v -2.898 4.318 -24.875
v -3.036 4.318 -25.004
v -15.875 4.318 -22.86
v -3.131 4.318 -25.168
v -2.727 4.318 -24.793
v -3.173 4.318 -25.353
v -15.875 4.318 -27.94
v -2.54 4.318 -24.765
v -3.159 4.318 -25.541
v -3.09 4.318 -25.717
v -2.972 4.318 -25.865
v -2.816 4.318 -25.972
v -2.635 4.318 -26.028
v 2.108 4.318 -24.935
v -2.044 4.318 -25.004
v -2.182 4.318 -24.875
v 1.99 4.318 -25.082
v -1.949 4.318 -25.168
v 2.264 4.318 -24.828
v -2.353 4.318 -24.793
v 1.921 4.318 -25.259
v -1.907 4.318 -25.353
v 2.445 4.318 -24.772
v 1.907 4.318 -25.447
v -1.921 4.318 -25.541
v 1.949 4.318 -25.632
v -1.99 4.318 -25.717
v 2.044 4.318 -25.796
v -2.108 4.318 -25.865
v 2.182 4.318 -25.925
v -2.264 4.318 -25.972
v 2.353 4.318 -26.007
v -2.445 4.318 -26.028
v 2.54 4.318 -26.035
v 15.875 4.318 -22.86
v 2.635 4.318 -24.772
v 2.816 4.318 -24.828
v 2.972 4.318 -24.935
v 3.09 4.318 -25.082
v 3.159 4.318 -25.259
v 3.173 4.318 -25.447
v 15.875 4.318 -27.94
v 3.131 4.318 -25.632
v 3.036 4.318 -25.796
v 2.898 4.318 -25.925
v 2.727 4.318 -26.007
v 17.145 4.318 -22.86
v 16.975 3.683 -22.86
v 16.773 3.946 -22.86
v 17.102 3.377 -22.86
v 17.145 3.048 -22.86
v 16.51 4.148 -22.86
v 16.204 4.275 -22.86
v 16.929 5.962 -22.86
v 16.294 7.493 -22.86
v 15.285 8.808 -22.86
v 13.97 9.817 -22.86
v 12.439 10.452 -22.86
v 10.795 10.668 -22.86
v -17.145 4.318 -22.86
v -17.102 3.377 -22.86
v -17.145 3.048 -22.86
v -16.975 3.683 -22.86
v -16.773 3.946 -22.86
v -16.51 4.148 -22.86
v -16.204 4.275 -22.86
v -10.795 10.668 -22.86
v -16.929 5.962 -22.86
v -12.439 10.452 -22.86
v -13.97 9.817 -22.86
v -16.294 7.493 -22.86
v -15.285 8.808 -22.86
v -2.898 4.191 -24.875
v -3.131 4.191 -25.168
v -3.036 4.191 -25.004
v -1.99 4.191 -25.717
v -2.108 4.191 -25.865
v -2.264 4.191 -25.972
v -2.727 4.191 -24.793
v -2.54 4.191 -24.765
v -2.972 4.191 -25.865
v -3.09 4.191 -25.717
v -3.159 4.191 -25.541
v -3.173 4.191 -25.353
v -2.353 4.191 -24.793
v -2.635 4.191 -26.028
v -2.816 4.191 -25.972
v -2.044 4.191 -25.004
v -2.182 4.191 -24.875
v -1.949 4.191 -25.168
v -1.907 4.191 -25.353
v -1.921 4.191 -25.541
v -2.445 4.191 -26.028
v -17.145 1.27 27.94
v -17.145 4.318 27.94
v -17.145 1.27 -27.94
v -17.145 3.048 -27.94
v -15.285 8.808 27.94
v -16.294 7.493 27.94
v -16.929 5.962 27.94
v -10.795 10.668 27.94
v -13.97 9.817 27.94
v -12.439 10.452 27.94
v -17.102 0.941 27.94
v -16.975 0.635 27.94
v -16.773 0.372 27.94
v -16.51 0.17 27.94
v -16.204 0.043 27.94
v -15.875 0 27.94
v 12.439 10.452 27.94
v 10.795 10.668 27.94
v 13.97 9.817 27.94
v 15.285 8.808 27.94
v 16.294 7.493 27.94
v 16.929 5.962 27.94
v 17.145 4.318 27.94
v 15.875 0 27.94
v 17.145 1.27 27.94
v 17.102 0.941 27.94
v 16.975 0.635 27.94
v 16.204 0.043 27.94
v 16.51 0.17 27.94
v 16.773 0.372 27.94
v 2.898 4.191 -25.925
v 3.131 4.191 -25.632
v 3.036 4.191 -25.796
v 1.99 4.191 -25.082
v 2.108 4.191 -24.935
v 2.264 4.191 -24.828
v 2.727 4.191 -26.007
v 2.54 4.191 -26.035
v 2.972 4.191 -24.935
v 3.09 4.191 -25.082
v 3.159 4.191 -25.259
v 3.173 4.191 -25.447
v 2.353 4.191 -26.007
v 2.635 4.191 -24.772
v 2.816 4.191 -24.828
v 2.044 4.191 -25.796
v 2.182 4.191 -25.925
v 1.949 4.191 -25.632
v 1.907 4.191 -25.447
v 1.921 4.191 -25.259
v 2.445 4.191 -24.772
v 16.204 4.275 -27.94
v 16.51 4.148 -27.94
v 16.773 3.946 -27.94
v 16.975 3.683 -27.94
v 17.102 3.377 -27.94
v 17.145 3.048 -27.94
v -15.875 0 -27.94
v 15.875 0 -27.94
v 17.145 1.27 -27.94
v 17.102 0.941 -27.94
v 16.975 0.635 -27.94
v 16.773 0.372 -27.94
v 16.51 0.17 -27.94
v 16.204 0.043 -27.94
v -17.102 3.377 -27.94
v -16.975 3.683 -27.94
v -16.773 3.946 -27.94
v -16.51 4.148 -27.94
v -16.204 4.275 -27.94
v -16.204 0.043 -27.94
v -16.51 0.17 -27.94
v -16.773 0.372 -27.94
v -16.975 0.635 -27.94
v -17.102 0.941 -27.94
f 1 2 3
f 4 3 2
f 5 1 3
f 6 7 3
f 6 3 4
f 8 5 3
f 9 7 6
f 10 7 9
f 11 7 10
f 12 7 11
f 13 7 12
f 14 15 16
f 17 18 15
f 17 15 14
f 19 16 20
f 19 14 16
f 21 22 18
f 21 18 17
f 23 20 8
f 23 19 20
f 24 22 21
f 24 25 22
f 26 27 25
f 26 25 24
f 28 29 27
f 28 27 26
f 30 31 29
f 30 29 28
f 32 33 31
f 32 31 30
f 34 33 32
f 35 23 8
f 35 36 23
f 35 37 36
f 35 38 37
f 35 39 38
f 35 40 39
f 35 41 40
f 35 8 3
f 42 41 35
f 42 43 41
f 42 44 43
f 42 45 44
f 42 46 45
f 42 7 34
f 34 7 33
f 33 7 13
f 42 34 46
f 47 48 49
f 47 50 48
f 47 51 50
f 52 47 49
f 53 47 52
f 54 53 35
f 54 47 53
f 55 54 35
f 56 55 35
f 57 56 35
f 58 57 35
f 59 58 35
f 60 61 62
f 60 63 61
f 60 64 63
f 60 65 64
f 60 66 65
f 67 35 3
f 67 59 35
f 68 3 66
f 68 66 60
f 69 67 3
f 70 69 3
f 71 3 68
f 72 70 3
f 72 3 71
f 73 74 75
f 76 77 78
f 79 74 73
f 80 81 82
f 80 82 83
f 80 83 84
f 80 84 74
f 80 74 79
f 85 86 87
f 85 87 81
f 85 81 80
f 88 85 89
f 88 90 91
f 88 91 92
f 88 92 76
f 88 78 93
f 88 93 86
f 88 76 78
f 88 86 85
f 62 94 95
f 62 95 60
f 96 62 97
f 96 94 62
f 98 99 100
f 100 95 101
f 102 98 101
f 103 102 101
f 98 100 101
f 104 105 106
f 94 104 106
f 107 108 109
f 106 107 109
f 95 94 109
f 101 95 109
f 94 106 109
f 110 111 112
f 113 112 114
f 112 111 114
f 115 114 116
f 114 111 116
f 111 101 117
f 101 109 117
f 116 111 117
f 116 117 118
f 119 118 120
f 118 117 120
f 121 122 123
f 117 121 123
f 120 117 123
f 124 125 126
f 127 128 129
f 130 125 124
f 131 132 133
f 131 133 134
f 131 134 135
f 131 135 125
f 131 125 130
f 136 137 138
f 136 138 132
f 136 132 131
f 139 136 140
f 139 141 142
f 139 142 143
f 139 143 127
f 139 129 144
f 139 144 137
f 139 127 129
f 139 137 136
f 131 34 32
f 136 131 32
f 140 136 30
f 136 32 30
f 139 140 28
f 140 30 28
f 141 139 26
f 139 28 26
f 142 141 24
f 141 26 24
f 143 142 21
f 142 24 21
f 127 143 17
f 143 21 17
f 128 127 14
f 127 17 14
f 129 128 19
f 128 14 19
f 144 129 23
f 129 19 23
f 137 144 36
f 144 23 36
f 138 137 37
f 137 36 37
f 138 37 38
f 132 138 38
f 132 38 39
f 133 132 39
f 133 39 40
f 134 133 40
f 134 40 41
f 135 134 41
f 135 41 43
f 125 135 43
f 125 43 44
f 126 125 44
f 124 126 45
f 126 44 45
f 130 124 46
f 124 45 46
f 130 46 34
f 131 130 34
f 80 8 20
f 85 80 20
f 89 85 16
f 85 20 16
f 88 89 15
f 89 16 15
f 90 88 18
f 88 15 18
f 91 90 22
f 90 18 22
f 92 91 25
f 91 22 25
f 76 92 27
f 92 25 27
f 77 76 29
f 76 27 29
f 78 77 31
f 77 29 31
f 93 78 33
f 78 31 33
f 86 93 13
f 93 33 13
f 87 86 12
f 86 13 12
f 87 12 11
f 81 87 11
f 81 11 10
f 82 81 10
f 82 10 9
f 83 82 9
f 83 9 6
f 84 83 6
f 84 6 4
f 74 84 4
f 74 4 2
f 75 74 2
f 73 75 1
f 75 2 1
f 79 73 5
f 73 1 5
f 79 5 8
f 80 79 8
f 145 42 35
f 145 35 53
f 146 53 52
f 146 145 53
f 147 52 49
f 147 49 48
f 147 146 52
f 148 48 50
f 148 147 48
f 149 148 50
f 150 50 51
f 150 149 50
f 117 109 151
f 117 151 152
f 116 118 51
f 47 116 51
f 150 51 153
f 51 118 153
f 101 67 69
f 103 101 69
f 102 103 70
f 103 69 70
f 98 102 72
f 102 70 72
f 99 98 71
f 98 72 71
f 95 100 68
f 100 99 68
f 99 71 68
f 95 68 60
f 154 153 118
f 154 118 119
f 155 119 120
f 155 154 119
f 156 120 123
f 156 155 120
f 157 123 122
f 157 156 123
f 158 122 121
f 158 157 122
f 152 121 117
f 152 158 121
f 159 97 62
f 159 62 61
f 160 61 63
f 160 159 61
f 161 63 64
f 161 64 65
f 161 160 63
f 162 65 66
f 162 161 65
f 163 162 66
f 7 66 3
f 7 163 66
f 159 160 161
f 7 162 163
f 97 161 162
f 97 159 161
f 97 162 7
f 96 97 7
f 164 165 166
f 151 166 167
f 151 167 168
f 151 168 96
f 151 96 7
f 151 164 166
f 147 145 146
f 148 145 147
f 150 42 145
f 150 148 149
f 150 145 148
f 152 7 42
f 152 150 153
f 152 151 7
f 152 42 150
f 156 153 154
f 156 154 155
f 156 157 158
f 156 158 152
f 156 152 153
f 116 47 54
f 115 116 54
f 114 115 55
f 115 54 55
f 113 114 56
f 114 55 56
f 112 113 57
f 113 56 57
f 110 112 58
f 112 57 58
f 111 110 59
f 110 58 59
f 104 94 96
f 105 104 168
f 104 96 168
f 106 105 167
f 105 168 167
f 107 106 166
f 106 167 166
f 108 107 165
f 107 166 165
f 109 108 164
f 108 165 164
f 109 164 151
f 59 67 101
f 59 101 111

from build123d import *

# Parameters (mm, degrees)
SKETCH1_W           = 34.29
SKETCH1_H           = 55.88
BOSS_EXTRUDE1_DEPTH = 4.318
SKETCH2_W           = 34.29
SKETCH2_H           = 50.8
BOSS_EXTRUDE2_DEPTH = 6.35
SKETCH3_OUTSIDE_W   = 49.574
SKETCH3_OUTSIDE_H   = 25.952
CUT_EXTRUDE1_DEPTH  = 5.08
CUT_EXTRUDE2_DEPTH  = 55.666234999
SKETCH6_R           = 0.635
CUT_EXTRUDE3_DEPTH  = 0.127


with BuildPart() as part:
    # Sketch1 → Boss-Extrude1 (new body)
    with BuildSketch(Plane(origin=(0, 0, 0), x_dir=(1, 0, 0), z_dir=(0, 1, 0))):
        Rectangle(SKETCH1_W, SKETCH1_H)
    extrude(amount=BOSS_EXTRUDE1_DEPTH)

    # Sketch2 → Boss-Extrude2 (add)
    with BuildSketch(Plane(origin=(0, 4.318, 0), x_dir=(1, 0, 0), z_dir=(0, 1, 0))):
        with Locations((0, -2.54)):
            Rectangle(SKETCH2_W, SKETCH2_H)
    extrude(amount=BOSS_EXTRUDE2_DEPTH)

    # Sketch3 outside → Cut-Extrude1 (cut)
    with BuildSketch(Plane(origin=(0, 0, -27.94), x_dir=(-1, 0, 0), z_dir=(0, 0, -1))):
        with Locations((0, 5.334)):
            Rectangle(SKETCH3_OUTSIDE_W, SKETCH3_OUTSIDE_H)
        with BuildLine():
            Line((-15.875, 0), (15.875, 0))
            ThreePointArc((15.875, 0), (16.773025612, 0.371974388), (17.145, 1.27))
            Line((17.145, 1.27), (17.145, 3.048))
            ThreePointArc((17.145, 3.048), (16.773025612, 3.946025612), (15.875, 4.318))
            Line((15.875, 4.318), (-15.875, 4.318))
            ThreePointArc((-15.875, 4.318), (-16.773025612, 3.946025612), (-17.145, 3.048))
            Line((-17.145, 3.048), (-17.145, 1.27))
            ThreePointArc((-17.145, 1.27), (-16.773025612, 0.371974388), (-15.875, 0))
        make_face(mode=Mode.SUBTRACT)
    extrude(amount=-CUT_EXTRUDE1_DEPTH, mode=Mode.SUBTRACT)

    # Sketch4 → Cut-Extrude2 (cut, through all)
    with BuildSketch(Plane(origin=(0, 0, -22.86), x_dir=(-1, 0, 0), z_dir=(0, 0, -1))):
        with BuildLine():
            Line((-17.145, 10.668), (-17.145, 4.318))
            ThreePointArc((-17.145, 4.318), (-15.285128061, 8.808128061), (-10.795, 10.668))
            Line((-10.795, 10.668), (-17.145, 10.668))
        make_face()
        with BuildLine():
            Line((17.145, 10.668), (10.795, 10.668))
            ThreePointArc((10.795, 10.668), (15.285128061, 8.808128061), (17.145, 4.318))
            Line((17.145, 4.318), (17.145, 10.668))
        make_face()
        with BuildLine():
            Line((-17.145, 1.27), (-17.145, 0))
            Line((-17.145, 0), (-15.875, 0))
            ThreePointArc((-15.875, 0), (-16.773025612, 0.371974388), (-17.145, 1.27))
        make_face()
        with BuildLine():
            Line((17.145, 0), (17.145, 1.27))
            ThreePointArc((17.145, 1.27), (16.773025612, 0.371974388), (15.875, 0))
            Line((15.875, 0), (17.145, 0))
        make_face()
    extrude(amount=-CUT_EXTRUDE2_DEPTH, mode=Mode.SUBTRACT)

    # Sketch6 → Cut-Extrude3 (cut)
    with BuildSketch(Plane(origin=(0, 4.318, 0), x_dir=(1, 0, 0), z_dir=(0, 1, 0))):
        with Locations(Location((-2.54, 25.4, 0), (0, 0, 270))):
            Circle(SKETCH6_R)
        with Locations(Location((2.54, 25.4, 0), (0, 0, 90))):
            Circle(SKETCH6_R)
    extrude(amount=-CUT_EXTRUDE3_DEPTH, mode=Mode.SUBTRACT)


solid = part.part
